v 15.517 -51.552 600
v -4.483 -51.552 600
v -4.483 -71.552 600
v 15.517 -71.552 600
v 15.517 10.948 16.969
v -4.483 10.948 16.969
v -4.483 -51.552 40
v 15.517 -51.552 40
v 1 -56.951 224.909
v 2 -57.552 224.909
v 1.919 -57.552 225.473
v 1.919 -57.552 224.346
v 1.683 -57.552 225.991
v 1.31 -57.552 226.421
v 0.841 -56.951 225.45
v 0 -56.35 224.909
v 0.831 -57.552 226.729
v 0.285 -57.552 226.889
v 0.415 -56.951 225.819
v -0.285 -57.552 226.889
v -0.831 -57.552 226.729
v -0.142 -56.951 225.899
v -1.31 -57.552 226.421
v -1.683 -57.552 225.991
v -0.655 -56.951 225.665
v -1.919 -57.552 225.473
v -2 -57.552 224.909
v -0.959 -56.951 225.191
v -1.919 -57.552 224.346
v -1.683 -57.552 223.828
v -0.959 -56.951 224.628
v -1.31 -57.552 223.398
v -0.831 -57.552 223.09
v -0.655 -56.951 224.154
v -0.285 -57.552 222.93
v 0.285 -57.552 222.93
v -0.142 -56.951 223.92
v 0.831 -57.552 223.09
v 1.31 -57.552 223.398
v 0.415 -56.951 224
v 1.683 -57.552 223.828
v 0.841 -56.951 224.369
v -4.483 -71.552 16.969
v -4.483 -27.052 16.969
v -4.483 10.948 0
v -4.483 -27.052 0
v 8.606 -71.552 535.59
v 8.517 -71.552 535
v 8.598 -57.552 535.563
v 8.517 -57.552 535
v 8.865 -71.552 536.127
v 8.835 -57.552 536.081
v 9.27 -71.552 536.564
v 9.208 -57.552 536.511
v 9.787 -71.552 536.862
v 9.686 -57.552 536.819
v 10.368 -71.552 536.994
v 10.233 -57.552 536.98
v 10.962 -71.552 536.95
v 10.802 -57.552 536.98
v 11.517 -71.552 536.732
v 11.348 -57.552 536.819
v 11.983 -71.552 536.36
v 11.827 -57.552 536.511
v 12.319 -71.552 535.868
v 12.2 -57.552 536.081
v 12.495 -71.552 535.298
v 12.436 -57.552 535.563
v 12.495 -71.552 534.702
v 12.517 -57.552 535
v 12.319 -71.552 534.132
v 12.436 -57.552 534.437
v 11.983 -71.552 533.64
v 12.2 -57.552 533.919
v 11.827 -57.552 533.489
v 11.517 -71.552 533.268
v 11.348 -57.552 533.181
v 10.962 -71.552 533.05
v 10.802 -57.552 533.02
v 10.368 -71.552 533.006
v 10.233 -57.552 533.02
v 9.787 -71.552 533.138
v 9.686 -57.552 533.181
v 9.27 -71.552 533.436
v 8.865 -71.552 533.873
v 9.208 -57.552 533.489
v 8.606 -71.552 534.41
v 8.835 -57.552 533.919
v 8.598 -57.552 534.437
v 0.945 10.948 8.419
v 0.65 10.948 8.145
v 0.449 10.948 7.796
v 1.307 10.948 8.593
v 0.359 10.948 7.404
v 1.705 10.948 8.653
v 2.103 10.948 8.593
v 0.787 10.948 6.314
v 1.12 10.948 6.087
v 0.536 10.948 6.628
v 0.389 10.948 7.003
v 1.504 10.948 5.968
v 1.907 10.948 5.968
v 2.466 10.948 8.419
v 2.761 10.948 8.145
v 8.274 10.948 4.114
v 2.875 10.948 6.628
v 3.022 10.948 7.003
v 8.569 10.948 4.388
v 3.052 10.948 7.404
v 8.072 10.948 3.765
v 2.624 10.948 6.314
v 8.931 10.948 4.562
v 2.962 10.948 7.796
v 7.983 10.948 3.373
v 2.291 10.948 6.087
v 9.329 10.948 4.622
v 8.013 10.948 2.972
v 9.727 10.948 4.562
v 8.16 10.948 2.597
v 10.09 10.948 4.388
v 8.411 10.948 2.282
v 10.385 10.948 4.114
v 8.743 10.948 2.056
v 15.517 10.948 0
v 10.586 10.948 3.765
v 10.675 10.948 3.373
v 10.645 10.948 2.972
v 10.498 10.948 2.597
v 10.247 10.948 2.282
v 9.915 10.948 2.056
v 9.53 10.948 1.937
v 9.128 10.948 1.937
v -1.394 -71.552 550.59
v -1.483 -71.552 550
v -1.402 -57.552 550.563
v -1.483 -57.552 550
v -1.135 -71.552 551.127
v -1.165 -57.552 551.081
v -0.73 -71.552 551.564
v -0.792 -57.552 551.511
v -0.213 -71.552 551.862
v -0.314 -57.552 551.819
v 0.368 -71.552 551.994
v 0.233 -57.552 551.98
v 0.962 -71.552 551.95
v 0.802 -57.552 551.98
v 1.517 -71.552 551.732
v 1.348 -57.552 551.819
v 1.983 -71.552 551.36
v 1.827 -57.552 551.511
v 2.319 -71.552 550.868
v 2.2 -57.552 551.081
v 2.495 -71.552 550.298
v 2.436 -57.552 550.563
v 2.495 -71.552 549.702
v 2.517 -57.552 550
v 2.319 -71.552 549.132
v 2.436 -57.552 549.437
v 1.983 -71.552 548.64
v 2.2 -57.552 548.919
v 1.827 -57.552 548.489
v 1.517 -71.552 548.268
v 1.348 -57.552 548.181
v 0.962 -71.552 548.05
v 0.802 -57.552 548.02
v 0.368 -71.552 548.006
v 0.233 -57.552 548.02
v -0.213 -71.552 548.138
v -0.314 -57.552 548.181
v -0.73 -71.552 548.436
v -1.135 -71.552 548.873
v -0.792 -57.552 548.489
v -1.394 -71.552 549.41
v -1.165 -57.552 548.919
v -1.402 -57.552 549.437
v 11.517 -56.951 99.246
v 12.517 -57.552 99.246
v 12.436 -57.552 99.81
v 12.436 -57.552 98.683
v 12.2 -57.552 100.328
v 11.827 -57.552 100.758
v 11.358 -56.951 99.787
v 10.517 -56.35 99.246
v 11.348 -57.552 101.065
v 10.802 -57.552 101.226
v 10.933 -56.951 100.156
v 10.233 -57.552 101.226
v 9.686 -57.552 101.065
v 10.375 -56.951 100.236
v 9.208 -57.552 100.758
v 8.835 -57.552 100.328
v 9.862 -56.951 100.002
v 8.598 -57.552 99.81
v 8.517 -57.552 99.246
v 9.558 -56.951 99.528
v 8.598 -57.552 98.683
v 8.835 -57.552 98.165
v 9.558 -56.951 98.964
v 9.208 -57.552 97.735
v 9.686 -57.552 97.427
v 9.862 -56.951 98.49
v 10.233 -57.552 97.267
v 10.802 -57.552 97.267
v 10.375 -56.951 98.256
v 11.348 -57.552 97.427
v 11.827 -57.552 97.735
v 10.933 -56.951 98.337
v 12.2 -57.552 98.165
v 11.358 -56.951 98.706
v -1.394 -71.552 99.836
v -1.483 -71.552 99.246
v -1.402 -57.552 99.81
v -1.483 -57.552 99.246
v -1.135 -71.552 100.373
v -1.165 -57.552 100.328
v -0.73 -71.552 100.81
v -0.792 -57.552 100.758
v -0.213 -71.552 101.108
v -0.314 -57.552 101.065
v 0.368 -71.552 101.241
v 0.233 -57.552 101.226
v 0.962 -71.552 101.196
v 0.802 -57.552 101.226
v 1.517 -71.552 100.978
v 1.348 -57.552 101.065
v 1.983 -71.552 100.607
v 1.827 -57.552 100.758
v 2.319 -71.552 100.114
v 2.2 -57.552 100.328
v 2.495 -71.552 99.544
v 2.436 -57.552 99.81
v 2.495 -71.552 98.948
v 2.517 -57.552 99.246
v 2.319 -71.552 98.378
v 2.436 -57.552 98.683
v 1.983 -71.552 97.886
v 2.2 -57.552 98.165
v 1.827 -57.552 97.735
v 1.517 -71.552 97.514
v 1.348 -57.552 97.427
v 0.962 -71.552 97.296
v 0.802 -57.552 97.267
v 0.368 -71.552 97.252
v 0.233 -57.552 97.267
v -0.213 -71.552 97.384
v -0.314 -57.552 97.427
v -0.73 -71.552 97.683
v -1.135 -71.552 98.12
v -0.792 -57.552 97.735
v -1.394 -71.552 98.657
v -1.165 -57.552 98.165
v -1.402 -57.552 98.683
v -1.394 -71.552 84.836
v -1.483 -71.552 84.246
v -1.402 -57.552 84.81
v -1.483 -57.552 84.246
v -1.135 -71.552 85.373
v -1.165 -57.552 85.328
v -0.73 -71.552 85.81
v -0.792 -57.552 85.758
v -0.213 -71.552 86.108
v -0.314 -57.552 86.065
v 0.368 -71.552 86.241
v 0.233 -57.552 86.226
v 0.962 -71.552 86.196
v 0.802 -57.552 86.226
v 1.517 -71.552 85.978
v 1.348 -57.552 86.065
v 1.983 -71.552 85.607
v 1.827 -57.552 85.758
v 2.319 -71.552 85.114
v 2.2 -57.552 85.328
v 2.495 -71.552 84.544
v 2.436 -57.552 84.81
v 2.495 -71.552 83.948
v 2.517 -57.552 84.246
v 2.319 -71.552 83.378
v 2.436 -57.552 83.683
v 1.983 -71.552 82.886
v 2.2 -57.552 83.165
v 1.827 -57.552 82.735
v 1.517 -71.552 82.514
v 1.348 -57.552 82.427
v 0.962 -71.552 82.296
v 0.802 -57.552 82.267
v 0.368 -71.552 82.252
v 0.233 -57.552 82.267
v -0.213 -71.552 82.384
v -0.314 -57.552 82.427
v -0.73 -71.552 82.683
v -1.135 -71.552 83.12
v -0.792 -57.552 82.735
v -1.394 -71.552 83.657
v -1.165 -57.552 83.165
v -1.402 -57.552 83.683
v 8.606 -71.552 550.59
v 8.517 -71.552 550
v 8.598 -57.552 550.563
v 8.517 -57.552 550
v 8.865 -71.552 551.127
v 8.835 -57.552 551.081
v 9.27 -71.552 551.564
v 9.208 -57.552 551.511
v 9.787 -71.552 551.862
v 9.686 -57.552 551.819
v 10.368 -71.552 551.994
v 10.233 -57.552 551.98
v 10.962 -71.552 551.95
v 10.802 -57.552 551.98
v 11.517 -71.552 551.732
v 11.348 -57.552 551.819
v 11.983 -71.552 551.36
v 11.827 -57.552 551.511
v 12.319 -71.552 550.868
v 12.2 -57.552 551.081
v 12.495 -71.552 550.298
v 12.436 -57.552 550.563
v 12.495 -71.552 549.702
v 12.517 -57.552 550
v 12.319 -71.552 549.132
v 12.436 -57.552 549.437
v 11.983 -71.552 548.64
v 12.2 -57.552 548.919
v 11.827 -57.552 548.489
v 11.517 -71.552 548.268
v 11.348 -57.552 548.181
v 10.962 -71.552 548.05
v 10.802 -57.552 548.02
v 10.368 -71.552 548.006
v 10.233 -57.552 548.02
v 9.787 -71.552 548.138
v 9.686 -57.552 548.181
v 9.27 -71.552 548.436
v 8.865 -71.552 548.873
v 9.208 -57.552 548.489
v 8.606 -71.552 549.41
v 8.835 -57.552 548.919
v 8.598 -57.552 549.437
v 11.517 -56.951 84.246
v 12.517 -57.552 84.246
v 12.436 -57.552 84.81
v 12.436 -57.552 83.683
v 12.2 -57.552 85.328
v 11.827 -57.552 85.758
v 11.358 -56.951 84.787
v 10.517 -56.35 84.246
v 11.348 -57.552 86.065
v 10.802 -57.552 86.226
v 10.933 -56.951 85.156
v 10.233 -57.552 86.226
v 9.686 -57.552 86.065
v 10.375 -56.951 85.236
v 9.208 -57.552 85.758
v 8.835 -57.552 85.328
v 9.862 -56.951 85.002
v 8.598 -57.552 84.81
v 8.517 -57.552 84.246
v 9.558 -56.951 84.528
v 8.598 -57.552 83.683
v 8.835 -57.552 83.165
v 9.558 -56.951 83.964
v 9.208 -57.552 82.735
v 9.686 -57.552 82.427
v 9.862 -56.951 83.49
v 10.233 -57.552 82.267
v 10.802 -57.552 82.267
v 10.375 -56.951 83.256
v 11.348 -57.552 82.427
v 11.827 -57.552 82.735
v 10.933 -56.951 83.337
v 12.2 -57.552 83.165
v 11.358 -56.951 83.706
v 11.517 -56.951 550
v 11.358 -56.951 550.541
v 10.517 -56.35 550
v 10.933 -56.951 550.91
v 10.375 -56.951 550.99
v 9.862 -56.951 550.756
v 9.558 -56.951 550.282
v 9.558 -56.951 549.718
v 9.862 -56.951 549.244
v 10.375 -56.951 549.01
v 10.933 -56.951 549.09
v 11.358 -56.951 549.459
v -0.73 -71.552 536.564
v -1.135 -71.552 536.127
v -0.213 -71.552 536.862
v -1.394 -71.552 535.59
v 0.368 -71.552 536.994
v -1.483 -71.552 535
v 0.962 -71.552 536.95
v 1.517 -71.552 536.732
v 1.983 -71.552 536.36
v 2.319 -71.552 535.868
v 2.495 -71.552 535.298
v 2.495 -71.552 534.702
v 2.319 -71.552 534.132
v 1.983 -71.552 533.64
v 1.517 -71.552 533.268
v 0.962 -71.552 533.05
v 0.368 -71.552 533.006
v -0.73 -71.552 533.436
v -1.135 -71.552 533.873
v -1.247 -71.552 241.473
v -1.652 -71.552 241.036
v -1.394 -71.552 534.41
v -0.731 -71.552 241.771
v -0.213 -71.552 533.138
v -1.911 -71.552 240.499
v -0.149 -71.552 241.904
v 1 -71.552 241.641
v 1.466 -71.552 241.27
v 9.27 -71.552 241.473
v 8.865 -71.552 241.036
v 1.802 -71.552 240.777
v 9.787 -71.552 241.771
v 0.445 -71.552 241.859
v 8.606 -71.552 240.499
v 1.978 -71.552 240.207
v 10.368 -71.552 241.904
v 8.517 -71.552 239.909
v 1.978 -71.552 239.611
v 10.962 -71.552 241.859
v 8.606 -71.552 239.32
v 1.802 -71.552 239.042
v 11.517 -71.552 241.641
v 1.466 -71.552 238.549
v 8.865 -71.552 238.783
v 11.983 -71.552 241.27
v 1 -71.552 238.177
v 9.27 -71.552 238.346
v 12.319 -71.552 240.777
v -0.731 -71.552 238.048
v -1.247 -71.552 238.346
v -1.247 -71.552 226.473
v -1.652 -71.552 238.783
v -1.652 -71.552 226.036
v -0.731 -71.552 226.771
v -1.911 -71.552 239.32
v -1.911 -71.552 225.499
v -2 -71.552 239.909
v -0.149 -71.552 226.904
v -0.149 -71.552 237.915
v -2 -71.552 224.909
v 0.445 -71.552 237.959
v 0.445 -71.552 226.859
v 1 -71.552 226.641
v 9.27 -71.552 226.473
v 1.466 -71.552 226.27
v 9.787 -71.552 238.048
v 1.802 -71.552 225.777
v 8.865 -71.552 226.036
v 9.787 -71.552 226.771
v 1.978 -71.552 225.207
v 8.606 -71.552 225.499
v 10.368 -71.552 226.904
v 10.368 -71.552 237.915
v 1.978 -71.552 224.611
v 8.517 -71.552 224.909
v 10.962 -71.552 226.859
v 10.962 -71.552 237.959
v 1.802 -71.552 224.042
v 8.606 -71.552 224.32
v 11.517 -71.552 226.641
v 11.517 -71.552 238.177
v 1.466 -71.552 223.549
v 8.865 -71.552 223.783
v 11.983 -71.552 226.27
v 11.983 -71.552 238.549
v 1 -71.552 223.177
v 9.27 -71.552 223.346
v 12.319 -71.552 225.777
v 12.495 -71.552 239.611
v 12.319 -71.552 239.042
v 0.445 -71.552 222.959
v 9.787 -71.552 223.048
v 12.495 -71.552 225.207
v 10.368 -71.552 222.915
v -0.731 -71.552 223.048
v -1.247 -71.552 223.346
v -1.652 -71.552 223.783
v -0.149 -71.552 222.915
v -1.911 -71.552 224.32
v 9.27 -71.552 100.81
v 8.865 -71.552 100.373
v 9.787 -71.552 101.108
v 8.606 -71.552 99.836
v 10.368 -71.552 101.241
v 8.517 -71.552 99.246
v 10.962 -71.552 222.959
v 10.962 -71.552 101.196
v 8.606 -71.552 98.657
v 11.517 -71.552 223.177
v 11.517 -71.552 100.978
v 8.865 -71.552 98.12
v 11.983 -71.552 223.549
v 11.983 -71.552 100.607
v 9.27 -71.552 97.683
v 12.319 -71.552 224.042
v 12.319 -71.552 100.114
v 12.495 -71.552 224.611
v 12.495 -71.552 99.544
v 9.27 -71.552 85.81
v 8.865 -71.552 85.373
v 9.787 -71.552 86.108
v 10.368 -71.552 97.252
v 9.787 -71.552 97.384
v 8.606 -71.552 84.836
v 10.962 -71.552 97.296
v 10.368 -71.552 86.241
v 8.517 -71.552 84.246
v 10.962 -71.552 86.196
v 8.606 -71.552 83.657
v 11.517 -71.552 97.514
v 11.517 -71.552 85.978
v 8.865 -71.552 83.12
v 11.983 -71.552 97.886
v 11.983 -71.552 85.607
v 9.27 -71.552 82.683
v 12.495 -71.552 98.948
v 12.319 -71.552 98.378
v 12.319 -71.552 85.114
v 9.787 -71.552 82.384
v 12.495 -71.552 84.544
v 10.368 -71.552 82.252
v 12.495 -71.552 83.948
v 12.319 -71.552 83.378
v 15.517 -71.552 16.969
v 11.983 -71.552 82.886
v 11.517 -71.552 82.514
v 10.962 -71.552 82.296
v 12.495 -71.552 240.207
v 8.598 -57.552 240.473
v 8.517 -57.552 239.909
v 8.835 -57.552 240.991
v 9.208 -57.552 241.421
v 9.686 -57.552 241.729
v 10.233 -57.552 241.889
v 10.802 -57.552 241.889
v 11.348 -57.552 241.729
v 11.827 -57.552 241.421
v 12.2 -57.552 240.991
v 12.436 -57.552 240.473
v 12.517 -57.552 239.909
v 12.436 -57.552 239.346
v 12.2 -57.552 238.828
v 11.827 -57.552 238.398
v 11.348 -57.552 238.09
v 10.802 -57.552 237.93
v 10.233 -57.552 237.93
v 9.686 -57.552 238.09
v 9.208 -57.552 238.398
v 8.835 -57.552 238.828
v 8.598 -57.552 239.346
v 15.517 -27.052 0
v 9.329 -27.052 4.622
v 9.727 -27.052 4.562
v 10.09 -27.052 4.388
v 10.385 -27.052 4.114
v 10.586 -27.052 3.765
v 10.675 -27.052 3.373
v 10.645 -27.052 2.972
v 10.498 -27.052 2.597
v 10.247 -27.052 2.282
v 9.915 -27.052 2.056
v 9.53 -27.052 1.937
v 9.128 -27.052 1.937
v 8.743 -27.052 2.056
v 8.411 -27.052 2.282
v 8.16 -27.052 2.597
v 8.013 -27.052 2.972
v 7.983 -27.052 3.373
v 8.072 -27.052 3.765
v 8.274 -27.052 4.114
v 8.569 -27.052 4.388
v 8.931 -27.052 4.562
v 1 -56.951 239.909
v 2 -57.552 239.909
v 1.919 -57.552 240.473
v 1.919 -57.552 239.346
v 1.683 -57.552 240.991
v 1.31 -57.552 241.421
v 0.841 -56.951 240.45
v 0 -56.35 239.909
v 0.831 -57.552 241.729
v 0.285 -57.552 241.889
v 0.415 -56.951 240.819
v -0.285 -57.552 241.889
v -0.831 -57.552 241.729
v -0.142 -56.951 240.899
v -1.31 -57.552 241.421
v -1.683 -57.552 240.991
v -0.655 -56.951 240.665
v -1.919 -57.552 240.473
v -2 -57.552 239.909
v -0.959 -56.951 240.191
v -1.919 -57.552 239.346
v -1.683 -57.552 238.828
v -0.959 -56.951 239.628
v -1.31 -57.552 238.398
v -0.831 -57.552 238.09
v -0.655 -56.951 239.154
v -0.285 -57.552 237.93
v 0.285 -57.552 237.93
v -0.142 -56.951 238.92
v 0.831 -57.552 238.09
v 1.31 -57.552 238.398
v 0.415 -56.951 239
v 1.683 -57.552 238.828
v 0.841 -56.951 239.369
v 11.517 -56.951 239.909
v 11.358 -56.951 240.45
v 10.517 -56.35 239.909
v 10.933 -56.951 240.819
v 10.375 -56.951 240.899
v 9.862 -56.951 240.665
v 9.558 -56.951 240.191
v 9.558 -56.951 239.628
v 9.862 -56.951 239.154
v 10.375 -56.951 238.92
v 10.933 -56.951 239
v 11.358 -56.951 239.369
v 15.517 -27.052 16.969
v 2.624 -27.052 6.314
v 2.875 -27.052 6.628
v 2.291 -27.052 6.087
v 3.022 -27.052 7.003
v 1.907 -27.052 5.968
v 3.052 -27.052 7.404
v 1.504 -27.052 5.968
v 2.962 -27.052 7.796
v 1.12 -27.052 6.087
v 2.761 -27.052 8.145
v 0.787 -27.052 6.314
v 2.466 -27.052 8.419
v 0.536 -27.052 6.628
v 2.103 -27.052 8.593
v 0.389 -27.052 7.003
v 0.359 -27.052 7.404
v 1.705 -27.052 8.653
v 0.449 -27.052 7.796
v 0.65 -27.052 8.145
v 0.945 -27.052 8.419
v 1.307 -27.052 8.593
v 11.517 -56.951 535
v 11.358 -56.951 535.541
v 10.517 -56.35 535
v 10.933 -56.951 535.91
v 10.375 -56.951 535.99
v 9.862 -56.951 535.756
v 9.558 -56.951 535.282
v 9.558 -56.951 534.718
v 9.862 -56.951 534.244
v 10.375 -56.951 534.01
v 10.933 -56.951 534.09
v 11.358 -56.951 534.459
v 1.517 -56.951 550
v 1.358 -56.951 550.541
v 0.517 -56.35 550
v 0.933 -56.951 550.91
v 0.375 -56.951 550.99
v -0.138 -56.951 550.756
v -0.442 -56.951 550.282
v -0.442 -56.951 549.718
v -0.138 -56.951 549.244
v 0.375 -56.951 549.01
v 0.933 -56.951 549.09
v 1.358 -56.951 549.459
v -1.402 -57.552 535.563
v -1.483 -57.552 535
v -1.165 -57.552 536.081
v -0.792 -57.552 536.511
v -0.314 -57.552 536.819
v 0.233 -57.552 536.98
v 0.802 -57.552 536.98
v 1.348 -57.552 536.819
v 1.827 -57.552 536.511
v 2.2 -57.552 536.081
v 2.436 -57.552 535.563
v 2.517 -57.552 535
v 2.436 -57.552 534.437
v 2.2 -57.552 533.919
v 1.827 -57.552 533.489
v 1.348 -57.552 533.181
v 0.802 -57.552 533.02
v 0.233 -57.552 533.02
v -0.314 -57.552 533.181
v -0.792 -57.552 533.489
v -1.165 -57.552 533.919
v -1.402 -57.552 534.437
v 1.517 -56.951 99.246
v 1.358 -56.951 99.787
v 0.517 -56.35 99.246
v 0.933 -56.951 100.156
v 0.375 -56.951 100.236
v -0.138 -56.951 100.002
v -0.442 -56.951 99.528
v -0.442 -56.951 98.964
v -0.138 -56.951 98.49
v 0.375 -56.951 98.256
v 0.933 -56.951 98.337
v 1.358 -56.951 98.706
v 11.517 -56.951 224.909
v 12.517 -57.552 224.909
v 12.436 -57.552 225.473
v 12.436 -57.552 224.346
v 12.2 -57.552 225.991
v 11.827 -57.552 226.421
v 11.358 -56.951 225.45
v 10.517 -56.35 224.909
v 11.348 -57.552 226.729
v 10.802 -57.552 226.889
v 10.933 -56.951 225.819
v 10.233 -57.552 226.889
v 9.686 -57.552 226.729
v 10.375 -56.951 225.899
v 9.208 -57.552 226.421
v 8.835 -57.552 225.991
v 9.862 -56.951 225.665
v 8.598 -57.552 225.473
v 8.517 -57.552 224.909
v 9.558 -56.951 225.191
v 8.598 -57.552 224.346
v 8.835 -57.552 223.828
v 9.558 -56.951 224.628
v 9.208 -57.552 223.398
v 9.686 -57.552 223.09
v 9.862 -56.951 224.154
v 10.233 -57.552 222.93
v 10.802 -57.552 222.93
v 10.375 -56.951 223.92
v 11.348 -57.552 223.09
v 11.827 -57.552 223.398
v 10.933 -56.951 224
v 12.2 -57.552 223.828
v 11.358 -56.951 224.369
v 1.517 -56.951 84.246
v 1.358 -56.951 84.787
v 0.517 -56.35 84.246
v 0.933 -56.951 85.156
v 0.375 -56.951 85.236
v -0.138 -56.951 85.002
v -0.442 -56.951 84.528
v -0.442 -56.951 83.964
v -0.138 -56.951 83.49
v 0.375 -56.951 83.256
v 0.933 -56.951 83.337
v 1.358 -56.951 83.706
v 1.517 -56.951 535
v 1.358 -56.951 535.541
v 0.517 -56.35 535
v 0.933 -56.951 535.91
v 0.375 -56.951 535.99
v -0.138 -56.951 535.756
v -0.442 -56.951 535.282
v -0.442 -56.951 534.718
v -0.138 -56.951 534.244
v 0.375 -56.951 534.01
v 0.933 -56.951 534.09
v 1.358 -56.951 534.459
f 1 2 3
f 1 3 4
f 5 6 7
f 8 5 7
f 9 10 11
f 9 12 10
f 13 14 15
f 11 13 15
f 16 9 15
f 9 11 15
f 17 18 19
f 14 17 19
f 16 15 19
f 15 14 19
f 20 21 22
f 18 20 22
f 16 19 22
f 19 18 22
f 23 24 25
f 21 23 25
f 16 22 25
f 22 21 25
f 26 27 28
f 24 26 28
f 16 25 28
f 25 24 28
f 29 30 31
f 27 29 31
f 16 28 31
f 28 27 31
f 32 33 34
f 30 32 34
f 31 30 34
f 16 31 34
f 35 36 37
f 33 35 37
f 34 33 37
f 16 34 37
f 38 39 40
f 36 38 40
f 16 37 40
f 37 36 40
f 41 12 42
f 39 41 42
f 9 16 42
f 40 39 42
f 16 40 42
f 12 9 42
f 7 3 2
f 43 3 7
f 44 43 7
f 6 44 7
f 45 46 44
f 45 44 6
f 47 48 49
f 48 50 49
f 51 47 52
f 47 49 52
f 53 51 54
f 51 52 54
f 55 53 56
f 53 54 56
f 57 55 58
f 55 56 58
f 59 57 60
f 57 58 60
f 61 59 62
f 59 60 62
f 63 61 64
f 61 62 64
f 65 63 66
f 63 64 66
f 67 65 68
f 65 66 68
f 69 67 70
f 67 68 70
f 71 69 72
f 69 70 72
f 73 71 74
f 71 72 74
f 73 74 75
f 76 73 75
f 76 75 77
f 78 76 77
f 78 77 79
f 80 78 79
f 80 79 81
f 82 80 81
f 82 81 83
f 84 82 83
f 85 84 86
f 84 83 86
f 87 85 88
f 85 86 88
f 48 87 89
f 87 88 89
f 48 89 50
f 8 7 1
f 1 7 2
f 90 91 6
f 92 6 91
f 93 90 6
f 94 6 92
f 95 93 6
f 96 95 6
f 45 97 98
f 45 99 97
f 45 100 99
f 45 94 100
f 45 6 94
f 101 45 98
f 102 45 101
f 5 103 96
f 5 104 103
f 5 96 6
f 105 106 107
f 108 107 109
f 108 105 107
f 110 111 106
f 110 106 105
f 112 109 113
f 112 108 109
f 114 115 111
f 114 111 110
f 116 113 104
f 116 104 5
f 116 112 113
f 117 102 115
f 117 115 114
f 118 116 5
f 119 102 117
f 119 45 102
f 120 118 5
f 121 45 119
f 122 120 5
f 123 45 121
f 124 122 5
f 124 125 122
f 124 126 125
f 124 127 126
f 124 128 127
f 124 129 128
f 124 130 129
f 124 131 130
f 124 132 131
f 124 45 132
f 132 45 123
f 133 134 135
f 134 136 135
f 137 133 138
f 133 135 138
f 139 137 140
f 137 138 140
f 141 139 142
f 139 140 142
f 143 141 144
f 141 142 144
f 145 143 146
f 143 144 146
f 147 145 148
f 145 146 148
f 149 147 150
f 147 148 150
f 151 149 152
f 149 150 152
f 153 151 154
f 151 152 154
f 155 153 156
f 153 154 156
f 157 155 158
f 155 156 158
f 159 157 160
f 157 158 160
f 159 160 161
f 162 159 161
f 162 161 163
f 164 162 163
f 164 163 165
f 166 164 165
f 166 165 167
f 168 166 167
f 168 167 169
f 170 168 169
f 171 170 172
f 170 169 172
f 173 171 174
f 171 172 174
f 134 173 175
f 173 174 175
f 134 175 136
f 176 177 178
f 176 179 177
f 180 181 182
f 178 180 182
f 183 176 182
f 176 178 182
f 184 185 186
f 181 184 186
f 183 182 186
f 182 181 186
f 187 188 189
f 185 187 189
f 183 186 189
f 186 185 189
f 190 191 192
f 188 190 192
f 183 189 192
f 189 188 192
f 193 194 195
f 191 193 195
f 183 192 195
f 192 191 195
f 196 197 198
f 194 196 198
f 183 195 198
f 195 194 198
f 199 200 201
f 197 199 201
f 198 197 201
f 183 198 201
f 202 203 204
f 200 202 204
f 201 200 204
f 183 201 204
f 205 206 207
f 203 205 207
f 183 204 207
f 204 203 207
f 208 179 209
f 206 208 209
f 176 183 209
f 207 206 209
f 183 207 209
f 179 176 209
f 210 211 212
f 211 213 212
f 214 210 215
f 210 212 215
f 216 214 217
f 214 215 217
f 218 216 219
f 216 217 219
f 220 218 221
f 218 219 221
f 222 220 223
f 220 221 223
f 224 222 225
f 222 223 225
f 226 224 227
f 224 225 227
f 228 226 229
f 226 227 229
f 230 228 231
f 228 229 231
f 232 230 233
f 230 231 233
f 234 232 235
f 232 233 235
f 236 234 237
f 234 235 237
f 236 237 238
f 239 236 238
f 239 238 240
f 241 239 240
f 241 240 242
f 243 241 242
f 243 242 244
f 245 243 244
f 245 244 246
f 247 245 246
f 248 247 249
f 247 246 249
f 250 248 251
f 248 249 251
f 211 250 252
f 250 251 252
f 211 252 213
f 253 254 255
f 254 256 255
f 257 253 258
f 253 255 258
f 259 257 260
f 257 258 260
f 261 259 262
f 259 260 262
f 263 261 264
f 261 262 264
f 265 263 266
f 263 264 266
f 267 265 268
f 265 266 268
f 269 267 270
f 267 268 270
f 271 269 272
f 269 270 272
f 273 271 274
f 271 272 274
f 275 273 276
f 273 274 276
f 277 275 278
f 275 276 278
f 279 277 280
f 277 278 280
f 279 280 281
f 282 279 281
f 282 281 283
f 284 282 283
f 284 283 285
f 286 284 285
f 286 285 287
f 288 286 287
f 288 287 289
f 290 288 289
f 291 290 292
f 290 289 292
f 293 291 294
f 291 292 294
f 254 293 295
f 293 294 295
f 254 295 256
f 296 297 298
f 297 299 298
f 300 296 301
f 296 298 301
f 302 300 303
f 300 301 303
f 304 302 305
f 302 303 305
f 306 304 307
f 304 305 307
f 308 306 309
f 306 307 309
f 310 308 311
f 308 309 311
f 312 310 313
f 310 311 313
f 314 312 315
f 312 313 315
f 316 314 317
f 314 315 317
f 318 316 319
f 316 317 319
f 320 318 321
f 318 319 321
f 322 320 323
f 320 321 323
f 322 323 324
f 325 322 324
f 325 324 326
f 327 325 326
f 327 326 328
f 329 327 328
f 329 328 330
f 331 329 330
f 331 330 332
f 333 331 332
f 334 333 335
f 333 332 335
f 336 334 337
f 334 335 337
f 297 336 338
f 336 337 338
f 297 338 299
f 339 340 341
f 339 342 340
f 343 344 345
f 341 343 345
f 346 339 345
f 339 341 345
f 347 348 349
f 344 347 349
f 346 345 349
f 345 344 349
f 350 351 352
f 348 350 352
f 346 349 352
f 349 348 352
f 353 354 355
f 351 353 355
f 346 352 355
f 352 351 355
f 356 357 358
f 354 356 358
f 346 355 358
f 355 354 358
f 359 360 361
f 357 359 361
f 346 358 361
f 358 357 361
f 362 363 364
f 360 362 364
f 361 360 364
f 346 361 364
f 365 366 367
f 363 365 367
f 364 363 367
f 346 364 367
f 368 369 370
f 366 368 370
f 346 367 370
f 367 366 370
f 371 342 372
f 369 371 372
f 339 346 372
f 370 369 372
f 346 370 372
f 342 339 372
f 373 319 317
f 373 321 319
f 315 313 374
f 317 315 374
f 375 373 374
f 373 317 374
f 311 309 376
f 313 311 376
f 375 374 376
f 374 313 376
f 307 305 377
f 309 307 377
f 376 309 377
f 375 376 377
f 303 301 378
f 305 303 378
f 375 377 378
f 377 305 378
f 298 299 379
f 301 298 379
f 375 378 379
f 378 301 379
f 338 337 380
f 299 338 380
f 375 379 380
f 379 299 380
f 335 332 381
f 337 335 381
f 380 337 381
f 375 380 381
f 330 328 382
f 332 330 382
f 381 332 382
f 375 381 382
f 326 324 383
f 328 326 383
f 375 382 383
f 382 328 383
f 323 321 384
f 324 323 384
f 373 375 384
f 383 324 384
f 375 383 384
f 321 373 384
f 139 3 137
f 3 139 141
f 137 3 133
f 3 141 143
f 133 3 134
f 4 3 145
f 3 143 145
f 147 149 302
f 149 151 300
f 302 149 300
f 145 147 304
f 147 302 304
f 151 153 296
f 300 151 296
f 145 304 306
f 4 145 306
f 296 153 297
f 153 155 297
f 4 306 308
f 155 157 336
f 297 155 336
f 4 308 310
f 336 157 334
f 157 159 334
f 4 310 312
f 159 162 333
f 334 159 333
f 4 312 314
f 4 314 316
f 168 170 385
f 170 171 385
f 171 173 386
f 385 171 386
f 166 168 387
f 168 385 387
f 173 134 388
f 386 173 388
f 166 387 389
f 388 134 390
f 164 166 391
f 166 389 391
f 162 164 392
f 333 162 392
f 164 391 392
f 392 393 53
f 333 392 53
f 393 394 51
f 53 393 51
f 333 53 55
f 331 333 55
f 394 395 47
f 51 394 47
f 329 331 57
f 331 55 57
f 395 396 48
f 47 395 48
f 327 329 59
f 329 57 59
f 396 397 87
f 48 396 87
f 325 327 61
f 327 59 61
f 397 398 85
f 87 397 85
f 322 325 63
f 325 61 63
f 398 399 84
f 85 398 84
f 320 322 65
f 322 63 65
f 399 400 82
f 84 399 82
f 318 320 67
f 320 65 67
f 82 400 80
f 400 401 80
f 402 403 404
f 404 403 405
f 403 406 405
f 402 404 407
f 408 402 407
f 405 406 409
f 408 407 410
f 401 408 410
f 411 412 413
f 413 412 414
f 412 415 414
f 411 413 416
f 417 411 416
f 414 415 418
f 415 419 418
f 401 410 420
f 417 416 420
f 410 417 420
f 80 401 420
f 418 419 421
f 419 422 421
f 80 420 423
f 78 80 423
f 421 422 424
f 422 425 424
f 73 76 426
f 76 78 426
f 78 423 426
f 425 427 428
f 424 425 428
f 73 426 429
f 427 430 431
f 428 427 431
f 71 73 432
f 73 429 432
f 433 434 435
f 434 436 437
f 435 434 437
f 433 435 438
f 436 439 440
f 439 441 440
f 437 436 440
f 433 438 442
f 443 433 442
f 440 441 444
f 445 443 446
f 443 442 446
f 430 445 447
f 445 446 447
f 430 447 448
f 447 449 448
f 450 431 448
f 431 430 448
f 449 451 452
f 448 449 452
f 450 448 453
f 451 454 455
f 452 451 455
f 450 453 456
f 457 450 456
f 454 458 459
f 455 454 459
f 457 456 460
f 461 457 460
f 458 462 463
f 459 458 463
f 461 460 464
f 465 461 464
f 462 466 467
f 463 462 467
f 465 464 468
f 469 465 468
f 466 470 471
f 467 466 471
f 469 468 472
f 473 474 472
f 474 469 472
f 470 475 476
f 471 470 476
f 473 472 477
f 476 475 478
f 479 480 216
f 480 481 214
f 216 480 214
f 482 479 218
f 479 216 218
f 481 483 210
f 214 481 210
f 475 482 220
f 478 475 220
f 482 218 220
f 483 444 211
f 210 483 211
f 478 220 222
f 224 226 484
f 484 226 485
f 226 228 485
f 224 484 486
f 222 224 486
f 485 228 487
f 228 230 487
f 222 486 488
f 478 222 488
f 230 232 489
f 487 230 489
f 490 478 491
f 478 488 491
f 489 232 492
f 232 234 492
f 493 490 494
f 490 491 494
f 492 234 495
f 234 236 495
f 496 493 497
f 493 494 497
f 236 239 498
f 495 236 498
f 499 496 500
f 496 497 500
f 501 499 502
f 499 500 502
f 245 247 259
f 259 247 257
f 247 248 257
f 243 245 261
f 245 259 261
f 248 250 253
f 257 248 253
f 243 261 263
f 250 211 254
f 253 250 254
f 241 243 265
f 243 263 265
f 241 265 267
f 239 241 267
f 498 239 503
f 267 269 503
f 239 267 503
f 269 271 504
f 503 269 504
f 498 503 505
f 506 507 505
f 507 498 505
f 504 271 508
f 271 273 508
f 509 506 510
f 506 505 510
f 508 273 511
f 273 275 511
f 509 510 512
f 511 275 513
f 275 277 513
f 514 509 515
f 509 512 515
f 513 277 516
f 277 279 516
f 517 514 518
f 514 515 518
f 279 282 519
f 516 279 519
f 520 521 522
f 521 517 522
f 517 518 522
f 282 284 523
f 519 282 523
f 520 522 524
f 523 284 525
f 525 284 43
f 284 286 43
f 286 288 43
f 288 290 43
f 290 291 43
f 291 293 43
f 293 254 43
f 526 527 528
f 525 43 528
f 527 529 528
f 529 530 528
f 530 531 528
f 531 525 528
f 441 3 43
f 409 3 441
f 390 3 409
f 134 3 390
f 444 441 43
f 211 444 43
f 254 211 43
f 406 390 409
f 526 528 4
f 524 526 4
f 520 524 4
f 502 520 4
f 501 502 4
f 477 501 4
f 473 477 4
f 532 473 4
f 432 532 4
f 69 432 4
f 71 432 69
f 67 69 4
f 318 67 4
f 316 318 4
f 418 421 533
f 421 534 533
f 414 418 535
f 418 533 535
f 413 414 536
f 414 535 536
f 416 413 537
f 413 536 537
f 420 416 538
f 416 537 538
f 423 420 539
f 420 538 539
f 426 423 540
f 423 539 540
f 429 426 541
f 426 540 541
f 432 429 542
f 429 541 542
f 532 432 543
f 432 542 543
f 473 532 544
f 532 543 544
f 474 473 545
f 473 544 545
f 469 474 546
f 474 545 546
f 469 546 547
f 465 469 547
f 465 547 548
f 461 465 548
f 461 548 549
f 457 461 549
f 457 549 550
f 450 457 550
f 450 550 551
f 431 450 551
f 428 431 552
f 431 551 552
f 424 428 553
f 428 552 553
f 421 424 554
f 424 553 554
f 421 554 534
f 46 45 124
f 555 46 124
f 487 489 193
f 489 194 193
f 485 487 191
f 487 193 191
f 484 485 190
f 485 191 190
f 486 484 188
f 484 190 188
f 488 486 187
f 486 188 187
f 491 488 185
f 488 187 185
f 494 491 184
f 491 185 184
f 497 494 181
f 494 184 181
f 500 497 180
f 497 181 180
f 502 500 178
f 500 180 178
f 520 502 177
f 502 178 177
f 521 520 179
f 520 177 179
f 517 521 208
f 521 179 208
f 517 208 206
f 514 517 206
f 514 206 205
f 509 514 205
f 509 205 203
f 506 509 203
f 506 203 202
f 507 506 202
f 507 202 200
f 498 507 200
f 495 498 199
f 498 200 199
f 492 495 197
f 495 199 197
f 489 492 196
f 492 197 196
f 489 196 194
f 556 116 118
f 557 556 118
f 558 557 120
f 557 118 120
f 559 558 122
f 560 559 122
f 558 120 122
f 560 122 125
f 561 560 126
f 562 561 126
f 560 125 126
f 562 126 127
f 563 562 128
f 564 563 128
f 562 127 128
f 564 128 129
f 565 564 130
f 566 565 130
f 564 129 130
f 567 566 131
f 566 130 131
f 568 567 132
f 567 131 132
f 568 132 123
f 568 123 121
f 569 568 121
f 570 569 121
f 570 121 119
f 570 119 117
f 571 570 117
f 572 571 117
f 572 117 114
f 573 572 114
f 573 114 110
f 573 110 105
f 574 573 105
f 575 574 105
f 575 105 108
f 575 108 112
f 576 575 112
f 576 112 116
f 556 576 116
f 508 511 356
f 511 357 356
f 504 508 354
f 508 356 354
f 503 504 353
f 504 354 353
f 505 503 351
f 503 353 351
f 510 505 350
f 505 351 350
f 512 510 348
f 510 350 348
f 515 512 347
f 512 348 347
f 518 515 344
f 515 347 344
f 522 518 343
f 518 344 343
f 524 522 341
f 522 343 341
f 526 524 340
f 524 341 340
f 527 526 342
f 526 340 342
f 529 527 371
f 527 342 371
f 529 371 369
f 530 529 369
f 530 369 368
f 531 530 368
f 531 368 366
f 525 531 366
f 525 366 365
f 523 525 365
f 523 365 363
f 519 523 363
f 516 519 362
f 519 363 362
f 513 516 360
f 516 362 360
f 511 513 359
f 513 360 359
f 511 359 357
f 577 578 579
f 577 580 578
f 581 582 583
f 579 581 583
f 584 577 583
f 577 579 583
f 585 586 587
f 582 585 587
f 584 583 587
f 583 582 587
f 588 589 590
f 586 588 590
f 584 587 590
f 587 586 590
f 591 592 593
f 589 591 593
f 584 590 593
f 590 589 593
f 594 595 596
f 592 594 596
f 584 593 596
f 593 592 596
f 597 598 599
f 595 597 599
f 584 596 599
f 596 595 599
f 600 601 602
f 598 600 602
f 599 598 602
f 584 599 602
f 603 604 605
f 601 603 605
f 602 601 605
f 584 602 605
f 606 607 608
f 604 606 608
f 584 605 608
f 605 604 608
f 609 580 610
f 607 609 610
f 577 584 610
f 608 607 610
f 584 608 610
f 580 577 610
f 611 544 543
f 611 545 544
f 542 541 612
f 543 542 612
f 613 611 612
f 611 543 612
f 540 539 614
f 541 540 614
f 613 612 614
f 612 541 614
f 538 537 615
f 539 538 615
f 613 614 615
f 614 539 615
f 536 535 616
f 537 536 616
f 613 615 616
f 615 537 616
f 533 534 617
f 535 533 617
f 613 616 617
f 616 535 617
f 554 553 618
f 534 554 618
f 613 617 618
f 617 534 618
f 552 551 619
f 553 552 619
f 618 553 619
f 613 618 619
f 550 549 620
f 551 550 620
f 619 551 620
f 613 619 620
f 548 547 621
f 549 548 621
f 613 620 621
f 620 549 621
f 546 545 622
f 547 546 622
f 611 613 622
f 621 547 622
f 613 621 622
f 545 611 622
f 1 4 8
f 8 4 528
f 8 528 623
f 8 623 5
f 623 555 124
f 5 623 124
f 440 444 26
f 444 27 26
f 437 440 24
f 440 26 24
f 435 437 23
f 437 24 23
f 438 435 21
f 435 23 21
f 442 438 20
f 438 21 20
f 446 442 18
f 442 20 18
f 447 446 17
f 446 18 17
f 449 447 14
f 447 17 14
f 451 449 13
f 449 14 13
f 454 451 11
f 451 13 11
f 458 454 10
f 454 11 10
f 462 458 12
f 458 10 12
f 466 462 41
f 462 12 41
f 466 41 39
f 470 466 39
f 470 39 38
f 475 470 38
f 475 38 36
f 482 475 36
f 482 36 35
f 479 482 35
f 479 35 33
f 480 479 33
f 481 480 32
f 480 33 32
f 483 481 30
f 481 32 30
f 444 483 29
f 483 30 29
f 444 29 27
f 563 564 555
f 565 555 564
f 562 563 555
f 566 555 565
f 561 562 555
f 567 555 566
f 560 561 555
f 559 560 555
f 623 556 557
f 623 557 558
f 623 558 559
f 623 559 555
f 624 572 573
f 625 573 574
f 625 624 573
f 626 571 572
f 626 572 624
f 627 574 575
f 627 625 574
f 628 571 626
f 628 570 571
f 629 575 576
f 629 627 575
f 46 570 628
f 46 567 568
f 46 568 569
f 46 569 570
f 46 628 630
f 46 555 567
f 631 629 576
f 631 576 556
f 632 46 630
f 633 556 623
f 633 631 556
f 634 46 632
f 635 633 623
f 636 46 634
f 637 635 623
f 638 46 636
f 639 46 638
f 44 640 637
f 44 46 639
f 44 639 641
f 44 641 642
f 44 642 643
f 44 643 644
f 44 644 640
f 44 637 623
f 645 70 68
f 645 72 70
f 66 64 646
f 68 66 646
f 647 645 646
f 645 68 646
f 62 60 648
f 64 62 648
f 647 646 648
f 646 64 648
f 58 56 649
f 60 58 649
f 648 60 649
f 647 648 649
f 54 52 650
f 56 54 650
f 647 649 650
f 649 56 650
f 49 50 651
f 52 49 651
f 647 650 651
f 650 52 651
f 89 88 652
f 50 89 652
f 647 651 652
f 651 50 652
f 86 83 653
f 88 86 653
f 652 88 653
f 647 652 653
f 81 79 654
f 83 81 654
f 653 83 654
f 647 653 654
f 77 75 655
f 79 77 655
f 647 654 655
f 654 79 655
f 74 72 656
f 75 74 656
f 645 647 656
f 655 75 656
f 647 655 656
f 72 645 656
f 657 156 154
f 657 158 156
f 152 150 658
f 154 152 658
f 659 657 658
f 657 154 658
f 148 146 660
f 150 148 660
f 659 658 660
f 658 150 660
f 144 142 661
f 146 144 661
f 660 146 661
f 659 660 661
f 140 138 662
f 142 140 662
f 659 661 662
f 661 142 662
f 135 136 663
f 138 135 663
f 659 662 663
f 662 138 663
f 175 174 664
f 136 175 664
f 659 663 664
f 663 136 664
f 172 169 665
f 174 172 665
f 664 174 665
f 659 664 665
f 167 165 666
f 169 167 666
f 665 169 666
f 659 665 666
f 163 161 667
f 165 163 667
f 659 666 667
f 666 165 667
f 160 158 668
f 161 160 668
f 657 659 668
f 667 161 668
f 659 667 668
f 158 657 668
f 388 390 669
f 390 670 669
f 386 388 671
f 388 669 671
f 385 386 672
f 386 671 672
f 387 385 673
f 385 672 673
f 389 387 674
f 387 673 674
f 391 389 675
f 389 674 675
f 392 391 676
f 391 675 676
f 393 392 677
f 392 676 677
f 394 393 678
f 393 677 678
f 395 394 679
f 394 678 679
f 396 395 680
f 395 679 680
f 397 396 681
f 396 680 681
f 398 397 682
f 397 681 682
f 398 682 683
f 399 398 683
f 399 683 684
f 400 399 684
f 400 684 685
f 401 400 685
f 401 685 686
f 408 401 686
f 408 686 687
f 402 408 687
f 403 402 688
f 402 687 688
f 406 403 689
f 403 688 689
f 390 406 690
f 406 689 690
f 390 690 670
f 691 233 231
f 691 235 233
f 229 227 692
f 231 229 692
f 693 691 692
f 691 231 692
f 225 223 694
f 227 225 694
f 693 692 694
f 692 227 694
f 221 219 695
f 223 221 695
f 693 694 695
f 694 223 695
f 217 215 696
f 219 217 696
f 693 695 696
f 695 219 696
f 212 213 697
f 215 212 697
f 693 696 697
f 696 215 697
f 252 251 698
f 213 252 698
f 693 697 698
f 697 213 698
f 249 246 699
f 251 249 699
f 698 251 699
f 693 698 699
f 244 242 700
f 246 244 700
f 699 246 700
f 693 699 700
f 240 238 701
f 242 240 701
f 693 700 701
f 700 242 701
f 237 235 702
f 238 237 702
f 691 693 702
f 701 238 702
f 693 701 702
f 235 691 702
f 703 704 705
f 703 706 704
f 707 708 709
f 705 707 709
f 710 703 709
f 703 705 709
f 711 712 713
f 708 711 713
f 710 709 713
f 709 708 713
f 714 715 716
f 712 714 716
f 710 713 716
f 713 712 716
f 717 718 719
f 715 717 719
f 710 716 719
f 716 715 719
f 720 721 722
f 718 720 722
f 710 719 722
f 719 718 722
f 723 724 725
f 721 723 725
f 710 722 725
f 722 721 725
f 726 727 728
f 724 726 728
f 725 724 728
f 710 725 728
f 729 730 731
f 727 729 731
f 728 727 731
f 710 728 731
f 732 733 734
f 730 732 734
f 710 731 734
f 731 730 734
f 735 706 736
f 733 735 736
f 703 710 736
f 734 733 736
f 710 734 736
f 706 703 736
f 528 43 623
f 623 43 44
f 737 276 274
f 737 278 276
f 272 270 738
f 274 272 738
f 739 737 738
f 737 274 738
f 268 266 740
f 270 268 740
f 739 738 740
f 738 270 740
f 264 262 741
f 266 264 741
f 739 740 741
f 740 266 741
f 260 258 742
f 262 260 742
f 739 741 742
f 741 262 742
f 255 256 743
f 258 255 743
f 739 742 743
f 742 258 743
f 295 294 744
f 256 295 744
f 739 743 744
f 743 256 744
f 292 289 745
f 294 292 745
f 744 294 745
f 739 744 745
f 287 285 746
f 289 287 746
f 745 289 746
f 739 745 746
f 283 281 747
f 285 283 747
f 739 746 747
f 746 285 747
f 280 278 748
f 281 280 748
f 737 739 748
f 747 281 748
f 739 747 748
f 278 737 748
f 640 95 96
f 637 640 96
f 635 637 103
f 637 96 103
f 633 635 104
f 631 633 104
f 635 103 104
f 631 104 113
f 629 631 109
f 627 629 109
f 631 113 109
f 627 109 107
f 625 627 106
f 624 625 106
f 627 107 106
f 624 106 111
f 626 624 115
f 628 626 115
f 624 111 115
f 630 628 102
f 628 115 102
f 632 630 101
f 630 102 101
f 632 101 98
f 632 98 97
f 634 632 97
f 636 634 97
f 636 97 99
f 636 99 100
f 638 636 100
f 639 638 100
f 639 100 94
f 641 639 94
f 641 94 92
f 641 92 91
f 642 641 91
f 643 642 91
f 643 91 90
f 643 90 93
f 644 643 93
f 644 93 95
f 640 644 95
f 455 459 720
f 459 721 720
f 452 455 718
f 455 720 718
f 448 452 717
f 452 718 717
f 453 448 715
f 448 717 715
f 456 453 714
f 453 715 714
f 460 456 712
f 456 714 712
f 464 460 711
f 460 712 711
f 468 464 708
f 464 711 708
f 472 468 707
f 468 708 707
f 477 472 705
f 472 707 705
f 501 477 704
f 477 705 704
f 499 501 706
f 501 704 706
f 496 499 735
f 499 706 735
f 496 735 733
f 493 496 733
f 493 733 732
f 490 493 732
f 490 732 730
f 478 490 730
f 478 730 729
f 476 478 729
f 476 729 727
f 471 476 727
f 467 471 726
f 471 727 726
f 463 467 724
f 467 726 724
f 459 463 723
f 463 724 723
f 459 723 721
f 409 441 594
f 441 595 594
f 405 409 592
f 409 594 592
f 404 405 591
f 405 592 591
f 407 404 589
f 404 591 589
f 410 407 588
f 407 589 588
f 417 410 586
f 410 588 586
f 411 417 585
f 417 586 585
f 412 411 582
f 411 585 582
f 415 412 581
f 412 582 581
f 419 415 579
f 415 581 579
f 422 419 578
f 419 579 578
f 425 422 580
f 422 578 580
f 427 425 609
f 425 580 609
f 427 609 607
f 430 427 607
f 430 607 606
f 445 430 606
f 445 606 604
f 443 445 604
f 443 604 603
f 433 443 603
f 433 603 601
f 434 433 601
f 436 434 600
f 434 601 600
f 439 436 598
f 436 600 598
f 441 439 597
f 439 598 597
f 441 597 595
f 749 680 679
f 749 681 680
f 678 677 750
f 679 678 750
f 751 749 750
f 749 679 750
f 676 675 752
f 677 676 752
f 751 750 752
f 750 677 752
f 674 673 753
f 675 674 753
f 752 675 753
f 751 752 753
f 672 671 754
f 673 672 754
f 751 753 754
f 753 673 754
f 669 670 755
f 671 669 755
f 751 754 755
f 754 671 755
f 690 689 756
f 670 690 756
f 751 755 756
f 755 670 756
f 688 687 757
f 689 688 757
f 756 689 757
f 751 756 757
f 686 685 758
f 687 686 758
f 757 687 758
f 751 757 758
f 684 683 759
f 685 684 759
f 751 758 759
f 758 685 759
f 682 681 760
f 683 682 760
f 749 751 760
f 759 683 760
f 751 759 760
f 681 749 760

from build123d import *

# Parameters (mm, degrees)
SKETCH1_W                 = 20
SKETCH1_H                 = 82.5
BOSS_EXTRUDE1_DEPTH       = 600
SKETCH2_R                 = 1.35
CUT_EXTRUDE1_DEPTH        = 600
CUT_EXTRUDE4_DEPTH        = 600
SKETCH6_W                 = 16.969486996
SKETCH6_H                 = 44.5
CUT_EXTRUDE5_DEPTH        = 600
F_4_0MM_DOWEL_HOLE3_D     = 4
F_4_0MM_DOWEL_HOLE3_DEPTH = 14
F_4_0MM_DOWEL_HOLE3_TIP   = 1.201721238
F_4_0MM_DOWEL_HOLE2_D     = 4
F_4_0MM_DOWEL_HOLE2_DEPTH = 14
F_4_0MM_DOWEL_HOLE2_TIP   = 1.201721238
F_4_0MM_DOWEL_HOLE4_D     = 4
F_4_0MM_DOWEL_HOLE4_DEPTH = 14
F_4_0MM_DOWEL_HOLE4_TIP   = 1.201721238
F_4_0MM_DOWEL_HOLE5_D     = 4
F_4_0MM_DOWEL_HOLE5_DEPTH = 14
F_4_0MM_DOWEL_HOLE5_TIP   = 1.201721238


with BuildPart() as part:
    # Sketch1 → Boss-Extrude1 (new body)
    with BuildSketch(Plane.XY):
        with Locations((5.517241379, -30.301724138)):
            Rectangle(SKETCH1_W, SKETCH1_H)
    extrude(amount=BOSS_EXTRUDE1_DEPTH)

    # Sketch2 → Cut-Extrude1 (cut)
    with BuildSketch(Plane(origin=(0, 10.948275862, 0), x_dir=(1, 0, 0), z_dir=(0, 1, 0))):
        with Locations(Location((9.329077472, -3.272098327, 0), (0, 0, 270))):
            Circle(SKETCH2_R)
        with Locations(Location((1.705405286, -7.303246399, 0), (0, 0, 270))):
            Circle(SKETCH2_R)
    extrude(amount=-CUT_EXTRUDE1_DEPTH, mode=Mode.SUBTRACT)

    # Sketch5 → Cut-Extrude4 (cut)
    with BuildSketch(Plane.ZY.offset(4.482758621)):
        Polygon((40, -51.551724138), (600, -51.551724138), (600, 10.948275862), (16.969486996, 10.948275862), align=None)
    extrude(amount=-CUT_EXTRUDE4_DEPTH, mode=Mode.SUBTRACT)

    # Sketch6 → Cut-Extrude5 (cut)
    with BuildSketch(Plane.ZY.offset(4.482758621)):
        with Locations((8.484743498, -49.301724138)):
            Rectangle(SKETCH6_W, SKETCH6_H)
    extrude(amount=-CUT_EXTRUDE5_DEPTH, mode=Mode.SUBTRACT)

    # Ø4.0mm Dowel Hole3
    with Locations(Plane.XZ.offset(71.551724138)):
        with Locations((10.517241379, 84.246230703), (10.517241379, 99.246230703), (10.517241379, 224.909334592), (10.517241379, 239.909334592), (10.517241379, 535), (10.517241379, 550)):
            Hole(F_4_0MM_DOWEL_HOLE3_D / 2, depth=F_4_0MM_DOWEL_HOLE3_DEPTH)
            with Locations((0, 0, -(F_4_0MM_DOWEL_HOLE3_DEPTH + F_4_0MM_DOWEL_HOLE3_TIP / 2))):  # 118° drill point
                Cone(0, F_4_0MM_DOWEL_HOLE3_D / 2, F_4_0MM_DOWEL_HOLE3_TIP, mode=Mode.SUBTRACT)

    # Ø4.0mm Dowel Hole2
    with Locations(Plane.XZ.offset(71.551724138)):
        with Locations((0.517241379, 550), (0.517241379, 535)):
            Hole(F_4_0MM_DOWEL_HOLE2_D / 2, depth=F_4_0MM_DOWEL_HOLE2_DEPTH)
            with Locations((0, 0, -(F_4_0MM_DOWEL_HOLE2_DEPTH + F_4_0MM_DOWEL_HOLE2_TIP / 2))):  # 118° drill point
                Cone(0, F_4_0MM_DOWEL_HOLE2_D / 2, F_4_0MM_DOWEL_HOLE2_TIP, mode=Mode.SUBTRACT)

    # Ø4.0mm Dowel Hole4
    with Locations(Plane.XZ.offset(71.551724138)):
        with Locations((0.517241379, 99.246230703), (0.517241379, 84.246230703)):
            Hole(F_4_0MM_DOWEL_HOLE4_D / 2, depth=F_4_0MM_DOWEL_HOLE4_DEPTH)
            with Locations((0, 0, -(F_4_0MM_DOWEL_HOLE4_DEPTH + F_4_0MM_DOWEL_HOLE4_TIP / 2))):  # 118° drill point
                Cone(0, F_4_0MM_DOWEL_HOLE4_D / 2, F_4_0MM_DOWEL_HOLE4_TIP, mode=Mode.SUBTRACT)

    # Ø4.0mm Dowel Hole5
    with Locations(Plane.XZ.offset(71.551724138)):
        with Locations((0, 224.909334592), (0, 239.909334592)):
            Hole(F_4_0MM_DOWEL_HOLE5_D / 2, depth=F_4_0MM_DOWEL_HOLE5_DEPTH)
            with Locations((0, 0, -(F_4_0MM_DOWEL_HOLE5_DEPTH + F_4_0MM_DOWEL_HOLE5_TIP / 2))):  # 118° drill point
                Cone(0, F_4_0MM_DOWEL_HOLE5_D / 2, F_4_0MM_DOWEL_HOLE5_TIP, mode=Mode.SUBTRACT)


solid = part.part
